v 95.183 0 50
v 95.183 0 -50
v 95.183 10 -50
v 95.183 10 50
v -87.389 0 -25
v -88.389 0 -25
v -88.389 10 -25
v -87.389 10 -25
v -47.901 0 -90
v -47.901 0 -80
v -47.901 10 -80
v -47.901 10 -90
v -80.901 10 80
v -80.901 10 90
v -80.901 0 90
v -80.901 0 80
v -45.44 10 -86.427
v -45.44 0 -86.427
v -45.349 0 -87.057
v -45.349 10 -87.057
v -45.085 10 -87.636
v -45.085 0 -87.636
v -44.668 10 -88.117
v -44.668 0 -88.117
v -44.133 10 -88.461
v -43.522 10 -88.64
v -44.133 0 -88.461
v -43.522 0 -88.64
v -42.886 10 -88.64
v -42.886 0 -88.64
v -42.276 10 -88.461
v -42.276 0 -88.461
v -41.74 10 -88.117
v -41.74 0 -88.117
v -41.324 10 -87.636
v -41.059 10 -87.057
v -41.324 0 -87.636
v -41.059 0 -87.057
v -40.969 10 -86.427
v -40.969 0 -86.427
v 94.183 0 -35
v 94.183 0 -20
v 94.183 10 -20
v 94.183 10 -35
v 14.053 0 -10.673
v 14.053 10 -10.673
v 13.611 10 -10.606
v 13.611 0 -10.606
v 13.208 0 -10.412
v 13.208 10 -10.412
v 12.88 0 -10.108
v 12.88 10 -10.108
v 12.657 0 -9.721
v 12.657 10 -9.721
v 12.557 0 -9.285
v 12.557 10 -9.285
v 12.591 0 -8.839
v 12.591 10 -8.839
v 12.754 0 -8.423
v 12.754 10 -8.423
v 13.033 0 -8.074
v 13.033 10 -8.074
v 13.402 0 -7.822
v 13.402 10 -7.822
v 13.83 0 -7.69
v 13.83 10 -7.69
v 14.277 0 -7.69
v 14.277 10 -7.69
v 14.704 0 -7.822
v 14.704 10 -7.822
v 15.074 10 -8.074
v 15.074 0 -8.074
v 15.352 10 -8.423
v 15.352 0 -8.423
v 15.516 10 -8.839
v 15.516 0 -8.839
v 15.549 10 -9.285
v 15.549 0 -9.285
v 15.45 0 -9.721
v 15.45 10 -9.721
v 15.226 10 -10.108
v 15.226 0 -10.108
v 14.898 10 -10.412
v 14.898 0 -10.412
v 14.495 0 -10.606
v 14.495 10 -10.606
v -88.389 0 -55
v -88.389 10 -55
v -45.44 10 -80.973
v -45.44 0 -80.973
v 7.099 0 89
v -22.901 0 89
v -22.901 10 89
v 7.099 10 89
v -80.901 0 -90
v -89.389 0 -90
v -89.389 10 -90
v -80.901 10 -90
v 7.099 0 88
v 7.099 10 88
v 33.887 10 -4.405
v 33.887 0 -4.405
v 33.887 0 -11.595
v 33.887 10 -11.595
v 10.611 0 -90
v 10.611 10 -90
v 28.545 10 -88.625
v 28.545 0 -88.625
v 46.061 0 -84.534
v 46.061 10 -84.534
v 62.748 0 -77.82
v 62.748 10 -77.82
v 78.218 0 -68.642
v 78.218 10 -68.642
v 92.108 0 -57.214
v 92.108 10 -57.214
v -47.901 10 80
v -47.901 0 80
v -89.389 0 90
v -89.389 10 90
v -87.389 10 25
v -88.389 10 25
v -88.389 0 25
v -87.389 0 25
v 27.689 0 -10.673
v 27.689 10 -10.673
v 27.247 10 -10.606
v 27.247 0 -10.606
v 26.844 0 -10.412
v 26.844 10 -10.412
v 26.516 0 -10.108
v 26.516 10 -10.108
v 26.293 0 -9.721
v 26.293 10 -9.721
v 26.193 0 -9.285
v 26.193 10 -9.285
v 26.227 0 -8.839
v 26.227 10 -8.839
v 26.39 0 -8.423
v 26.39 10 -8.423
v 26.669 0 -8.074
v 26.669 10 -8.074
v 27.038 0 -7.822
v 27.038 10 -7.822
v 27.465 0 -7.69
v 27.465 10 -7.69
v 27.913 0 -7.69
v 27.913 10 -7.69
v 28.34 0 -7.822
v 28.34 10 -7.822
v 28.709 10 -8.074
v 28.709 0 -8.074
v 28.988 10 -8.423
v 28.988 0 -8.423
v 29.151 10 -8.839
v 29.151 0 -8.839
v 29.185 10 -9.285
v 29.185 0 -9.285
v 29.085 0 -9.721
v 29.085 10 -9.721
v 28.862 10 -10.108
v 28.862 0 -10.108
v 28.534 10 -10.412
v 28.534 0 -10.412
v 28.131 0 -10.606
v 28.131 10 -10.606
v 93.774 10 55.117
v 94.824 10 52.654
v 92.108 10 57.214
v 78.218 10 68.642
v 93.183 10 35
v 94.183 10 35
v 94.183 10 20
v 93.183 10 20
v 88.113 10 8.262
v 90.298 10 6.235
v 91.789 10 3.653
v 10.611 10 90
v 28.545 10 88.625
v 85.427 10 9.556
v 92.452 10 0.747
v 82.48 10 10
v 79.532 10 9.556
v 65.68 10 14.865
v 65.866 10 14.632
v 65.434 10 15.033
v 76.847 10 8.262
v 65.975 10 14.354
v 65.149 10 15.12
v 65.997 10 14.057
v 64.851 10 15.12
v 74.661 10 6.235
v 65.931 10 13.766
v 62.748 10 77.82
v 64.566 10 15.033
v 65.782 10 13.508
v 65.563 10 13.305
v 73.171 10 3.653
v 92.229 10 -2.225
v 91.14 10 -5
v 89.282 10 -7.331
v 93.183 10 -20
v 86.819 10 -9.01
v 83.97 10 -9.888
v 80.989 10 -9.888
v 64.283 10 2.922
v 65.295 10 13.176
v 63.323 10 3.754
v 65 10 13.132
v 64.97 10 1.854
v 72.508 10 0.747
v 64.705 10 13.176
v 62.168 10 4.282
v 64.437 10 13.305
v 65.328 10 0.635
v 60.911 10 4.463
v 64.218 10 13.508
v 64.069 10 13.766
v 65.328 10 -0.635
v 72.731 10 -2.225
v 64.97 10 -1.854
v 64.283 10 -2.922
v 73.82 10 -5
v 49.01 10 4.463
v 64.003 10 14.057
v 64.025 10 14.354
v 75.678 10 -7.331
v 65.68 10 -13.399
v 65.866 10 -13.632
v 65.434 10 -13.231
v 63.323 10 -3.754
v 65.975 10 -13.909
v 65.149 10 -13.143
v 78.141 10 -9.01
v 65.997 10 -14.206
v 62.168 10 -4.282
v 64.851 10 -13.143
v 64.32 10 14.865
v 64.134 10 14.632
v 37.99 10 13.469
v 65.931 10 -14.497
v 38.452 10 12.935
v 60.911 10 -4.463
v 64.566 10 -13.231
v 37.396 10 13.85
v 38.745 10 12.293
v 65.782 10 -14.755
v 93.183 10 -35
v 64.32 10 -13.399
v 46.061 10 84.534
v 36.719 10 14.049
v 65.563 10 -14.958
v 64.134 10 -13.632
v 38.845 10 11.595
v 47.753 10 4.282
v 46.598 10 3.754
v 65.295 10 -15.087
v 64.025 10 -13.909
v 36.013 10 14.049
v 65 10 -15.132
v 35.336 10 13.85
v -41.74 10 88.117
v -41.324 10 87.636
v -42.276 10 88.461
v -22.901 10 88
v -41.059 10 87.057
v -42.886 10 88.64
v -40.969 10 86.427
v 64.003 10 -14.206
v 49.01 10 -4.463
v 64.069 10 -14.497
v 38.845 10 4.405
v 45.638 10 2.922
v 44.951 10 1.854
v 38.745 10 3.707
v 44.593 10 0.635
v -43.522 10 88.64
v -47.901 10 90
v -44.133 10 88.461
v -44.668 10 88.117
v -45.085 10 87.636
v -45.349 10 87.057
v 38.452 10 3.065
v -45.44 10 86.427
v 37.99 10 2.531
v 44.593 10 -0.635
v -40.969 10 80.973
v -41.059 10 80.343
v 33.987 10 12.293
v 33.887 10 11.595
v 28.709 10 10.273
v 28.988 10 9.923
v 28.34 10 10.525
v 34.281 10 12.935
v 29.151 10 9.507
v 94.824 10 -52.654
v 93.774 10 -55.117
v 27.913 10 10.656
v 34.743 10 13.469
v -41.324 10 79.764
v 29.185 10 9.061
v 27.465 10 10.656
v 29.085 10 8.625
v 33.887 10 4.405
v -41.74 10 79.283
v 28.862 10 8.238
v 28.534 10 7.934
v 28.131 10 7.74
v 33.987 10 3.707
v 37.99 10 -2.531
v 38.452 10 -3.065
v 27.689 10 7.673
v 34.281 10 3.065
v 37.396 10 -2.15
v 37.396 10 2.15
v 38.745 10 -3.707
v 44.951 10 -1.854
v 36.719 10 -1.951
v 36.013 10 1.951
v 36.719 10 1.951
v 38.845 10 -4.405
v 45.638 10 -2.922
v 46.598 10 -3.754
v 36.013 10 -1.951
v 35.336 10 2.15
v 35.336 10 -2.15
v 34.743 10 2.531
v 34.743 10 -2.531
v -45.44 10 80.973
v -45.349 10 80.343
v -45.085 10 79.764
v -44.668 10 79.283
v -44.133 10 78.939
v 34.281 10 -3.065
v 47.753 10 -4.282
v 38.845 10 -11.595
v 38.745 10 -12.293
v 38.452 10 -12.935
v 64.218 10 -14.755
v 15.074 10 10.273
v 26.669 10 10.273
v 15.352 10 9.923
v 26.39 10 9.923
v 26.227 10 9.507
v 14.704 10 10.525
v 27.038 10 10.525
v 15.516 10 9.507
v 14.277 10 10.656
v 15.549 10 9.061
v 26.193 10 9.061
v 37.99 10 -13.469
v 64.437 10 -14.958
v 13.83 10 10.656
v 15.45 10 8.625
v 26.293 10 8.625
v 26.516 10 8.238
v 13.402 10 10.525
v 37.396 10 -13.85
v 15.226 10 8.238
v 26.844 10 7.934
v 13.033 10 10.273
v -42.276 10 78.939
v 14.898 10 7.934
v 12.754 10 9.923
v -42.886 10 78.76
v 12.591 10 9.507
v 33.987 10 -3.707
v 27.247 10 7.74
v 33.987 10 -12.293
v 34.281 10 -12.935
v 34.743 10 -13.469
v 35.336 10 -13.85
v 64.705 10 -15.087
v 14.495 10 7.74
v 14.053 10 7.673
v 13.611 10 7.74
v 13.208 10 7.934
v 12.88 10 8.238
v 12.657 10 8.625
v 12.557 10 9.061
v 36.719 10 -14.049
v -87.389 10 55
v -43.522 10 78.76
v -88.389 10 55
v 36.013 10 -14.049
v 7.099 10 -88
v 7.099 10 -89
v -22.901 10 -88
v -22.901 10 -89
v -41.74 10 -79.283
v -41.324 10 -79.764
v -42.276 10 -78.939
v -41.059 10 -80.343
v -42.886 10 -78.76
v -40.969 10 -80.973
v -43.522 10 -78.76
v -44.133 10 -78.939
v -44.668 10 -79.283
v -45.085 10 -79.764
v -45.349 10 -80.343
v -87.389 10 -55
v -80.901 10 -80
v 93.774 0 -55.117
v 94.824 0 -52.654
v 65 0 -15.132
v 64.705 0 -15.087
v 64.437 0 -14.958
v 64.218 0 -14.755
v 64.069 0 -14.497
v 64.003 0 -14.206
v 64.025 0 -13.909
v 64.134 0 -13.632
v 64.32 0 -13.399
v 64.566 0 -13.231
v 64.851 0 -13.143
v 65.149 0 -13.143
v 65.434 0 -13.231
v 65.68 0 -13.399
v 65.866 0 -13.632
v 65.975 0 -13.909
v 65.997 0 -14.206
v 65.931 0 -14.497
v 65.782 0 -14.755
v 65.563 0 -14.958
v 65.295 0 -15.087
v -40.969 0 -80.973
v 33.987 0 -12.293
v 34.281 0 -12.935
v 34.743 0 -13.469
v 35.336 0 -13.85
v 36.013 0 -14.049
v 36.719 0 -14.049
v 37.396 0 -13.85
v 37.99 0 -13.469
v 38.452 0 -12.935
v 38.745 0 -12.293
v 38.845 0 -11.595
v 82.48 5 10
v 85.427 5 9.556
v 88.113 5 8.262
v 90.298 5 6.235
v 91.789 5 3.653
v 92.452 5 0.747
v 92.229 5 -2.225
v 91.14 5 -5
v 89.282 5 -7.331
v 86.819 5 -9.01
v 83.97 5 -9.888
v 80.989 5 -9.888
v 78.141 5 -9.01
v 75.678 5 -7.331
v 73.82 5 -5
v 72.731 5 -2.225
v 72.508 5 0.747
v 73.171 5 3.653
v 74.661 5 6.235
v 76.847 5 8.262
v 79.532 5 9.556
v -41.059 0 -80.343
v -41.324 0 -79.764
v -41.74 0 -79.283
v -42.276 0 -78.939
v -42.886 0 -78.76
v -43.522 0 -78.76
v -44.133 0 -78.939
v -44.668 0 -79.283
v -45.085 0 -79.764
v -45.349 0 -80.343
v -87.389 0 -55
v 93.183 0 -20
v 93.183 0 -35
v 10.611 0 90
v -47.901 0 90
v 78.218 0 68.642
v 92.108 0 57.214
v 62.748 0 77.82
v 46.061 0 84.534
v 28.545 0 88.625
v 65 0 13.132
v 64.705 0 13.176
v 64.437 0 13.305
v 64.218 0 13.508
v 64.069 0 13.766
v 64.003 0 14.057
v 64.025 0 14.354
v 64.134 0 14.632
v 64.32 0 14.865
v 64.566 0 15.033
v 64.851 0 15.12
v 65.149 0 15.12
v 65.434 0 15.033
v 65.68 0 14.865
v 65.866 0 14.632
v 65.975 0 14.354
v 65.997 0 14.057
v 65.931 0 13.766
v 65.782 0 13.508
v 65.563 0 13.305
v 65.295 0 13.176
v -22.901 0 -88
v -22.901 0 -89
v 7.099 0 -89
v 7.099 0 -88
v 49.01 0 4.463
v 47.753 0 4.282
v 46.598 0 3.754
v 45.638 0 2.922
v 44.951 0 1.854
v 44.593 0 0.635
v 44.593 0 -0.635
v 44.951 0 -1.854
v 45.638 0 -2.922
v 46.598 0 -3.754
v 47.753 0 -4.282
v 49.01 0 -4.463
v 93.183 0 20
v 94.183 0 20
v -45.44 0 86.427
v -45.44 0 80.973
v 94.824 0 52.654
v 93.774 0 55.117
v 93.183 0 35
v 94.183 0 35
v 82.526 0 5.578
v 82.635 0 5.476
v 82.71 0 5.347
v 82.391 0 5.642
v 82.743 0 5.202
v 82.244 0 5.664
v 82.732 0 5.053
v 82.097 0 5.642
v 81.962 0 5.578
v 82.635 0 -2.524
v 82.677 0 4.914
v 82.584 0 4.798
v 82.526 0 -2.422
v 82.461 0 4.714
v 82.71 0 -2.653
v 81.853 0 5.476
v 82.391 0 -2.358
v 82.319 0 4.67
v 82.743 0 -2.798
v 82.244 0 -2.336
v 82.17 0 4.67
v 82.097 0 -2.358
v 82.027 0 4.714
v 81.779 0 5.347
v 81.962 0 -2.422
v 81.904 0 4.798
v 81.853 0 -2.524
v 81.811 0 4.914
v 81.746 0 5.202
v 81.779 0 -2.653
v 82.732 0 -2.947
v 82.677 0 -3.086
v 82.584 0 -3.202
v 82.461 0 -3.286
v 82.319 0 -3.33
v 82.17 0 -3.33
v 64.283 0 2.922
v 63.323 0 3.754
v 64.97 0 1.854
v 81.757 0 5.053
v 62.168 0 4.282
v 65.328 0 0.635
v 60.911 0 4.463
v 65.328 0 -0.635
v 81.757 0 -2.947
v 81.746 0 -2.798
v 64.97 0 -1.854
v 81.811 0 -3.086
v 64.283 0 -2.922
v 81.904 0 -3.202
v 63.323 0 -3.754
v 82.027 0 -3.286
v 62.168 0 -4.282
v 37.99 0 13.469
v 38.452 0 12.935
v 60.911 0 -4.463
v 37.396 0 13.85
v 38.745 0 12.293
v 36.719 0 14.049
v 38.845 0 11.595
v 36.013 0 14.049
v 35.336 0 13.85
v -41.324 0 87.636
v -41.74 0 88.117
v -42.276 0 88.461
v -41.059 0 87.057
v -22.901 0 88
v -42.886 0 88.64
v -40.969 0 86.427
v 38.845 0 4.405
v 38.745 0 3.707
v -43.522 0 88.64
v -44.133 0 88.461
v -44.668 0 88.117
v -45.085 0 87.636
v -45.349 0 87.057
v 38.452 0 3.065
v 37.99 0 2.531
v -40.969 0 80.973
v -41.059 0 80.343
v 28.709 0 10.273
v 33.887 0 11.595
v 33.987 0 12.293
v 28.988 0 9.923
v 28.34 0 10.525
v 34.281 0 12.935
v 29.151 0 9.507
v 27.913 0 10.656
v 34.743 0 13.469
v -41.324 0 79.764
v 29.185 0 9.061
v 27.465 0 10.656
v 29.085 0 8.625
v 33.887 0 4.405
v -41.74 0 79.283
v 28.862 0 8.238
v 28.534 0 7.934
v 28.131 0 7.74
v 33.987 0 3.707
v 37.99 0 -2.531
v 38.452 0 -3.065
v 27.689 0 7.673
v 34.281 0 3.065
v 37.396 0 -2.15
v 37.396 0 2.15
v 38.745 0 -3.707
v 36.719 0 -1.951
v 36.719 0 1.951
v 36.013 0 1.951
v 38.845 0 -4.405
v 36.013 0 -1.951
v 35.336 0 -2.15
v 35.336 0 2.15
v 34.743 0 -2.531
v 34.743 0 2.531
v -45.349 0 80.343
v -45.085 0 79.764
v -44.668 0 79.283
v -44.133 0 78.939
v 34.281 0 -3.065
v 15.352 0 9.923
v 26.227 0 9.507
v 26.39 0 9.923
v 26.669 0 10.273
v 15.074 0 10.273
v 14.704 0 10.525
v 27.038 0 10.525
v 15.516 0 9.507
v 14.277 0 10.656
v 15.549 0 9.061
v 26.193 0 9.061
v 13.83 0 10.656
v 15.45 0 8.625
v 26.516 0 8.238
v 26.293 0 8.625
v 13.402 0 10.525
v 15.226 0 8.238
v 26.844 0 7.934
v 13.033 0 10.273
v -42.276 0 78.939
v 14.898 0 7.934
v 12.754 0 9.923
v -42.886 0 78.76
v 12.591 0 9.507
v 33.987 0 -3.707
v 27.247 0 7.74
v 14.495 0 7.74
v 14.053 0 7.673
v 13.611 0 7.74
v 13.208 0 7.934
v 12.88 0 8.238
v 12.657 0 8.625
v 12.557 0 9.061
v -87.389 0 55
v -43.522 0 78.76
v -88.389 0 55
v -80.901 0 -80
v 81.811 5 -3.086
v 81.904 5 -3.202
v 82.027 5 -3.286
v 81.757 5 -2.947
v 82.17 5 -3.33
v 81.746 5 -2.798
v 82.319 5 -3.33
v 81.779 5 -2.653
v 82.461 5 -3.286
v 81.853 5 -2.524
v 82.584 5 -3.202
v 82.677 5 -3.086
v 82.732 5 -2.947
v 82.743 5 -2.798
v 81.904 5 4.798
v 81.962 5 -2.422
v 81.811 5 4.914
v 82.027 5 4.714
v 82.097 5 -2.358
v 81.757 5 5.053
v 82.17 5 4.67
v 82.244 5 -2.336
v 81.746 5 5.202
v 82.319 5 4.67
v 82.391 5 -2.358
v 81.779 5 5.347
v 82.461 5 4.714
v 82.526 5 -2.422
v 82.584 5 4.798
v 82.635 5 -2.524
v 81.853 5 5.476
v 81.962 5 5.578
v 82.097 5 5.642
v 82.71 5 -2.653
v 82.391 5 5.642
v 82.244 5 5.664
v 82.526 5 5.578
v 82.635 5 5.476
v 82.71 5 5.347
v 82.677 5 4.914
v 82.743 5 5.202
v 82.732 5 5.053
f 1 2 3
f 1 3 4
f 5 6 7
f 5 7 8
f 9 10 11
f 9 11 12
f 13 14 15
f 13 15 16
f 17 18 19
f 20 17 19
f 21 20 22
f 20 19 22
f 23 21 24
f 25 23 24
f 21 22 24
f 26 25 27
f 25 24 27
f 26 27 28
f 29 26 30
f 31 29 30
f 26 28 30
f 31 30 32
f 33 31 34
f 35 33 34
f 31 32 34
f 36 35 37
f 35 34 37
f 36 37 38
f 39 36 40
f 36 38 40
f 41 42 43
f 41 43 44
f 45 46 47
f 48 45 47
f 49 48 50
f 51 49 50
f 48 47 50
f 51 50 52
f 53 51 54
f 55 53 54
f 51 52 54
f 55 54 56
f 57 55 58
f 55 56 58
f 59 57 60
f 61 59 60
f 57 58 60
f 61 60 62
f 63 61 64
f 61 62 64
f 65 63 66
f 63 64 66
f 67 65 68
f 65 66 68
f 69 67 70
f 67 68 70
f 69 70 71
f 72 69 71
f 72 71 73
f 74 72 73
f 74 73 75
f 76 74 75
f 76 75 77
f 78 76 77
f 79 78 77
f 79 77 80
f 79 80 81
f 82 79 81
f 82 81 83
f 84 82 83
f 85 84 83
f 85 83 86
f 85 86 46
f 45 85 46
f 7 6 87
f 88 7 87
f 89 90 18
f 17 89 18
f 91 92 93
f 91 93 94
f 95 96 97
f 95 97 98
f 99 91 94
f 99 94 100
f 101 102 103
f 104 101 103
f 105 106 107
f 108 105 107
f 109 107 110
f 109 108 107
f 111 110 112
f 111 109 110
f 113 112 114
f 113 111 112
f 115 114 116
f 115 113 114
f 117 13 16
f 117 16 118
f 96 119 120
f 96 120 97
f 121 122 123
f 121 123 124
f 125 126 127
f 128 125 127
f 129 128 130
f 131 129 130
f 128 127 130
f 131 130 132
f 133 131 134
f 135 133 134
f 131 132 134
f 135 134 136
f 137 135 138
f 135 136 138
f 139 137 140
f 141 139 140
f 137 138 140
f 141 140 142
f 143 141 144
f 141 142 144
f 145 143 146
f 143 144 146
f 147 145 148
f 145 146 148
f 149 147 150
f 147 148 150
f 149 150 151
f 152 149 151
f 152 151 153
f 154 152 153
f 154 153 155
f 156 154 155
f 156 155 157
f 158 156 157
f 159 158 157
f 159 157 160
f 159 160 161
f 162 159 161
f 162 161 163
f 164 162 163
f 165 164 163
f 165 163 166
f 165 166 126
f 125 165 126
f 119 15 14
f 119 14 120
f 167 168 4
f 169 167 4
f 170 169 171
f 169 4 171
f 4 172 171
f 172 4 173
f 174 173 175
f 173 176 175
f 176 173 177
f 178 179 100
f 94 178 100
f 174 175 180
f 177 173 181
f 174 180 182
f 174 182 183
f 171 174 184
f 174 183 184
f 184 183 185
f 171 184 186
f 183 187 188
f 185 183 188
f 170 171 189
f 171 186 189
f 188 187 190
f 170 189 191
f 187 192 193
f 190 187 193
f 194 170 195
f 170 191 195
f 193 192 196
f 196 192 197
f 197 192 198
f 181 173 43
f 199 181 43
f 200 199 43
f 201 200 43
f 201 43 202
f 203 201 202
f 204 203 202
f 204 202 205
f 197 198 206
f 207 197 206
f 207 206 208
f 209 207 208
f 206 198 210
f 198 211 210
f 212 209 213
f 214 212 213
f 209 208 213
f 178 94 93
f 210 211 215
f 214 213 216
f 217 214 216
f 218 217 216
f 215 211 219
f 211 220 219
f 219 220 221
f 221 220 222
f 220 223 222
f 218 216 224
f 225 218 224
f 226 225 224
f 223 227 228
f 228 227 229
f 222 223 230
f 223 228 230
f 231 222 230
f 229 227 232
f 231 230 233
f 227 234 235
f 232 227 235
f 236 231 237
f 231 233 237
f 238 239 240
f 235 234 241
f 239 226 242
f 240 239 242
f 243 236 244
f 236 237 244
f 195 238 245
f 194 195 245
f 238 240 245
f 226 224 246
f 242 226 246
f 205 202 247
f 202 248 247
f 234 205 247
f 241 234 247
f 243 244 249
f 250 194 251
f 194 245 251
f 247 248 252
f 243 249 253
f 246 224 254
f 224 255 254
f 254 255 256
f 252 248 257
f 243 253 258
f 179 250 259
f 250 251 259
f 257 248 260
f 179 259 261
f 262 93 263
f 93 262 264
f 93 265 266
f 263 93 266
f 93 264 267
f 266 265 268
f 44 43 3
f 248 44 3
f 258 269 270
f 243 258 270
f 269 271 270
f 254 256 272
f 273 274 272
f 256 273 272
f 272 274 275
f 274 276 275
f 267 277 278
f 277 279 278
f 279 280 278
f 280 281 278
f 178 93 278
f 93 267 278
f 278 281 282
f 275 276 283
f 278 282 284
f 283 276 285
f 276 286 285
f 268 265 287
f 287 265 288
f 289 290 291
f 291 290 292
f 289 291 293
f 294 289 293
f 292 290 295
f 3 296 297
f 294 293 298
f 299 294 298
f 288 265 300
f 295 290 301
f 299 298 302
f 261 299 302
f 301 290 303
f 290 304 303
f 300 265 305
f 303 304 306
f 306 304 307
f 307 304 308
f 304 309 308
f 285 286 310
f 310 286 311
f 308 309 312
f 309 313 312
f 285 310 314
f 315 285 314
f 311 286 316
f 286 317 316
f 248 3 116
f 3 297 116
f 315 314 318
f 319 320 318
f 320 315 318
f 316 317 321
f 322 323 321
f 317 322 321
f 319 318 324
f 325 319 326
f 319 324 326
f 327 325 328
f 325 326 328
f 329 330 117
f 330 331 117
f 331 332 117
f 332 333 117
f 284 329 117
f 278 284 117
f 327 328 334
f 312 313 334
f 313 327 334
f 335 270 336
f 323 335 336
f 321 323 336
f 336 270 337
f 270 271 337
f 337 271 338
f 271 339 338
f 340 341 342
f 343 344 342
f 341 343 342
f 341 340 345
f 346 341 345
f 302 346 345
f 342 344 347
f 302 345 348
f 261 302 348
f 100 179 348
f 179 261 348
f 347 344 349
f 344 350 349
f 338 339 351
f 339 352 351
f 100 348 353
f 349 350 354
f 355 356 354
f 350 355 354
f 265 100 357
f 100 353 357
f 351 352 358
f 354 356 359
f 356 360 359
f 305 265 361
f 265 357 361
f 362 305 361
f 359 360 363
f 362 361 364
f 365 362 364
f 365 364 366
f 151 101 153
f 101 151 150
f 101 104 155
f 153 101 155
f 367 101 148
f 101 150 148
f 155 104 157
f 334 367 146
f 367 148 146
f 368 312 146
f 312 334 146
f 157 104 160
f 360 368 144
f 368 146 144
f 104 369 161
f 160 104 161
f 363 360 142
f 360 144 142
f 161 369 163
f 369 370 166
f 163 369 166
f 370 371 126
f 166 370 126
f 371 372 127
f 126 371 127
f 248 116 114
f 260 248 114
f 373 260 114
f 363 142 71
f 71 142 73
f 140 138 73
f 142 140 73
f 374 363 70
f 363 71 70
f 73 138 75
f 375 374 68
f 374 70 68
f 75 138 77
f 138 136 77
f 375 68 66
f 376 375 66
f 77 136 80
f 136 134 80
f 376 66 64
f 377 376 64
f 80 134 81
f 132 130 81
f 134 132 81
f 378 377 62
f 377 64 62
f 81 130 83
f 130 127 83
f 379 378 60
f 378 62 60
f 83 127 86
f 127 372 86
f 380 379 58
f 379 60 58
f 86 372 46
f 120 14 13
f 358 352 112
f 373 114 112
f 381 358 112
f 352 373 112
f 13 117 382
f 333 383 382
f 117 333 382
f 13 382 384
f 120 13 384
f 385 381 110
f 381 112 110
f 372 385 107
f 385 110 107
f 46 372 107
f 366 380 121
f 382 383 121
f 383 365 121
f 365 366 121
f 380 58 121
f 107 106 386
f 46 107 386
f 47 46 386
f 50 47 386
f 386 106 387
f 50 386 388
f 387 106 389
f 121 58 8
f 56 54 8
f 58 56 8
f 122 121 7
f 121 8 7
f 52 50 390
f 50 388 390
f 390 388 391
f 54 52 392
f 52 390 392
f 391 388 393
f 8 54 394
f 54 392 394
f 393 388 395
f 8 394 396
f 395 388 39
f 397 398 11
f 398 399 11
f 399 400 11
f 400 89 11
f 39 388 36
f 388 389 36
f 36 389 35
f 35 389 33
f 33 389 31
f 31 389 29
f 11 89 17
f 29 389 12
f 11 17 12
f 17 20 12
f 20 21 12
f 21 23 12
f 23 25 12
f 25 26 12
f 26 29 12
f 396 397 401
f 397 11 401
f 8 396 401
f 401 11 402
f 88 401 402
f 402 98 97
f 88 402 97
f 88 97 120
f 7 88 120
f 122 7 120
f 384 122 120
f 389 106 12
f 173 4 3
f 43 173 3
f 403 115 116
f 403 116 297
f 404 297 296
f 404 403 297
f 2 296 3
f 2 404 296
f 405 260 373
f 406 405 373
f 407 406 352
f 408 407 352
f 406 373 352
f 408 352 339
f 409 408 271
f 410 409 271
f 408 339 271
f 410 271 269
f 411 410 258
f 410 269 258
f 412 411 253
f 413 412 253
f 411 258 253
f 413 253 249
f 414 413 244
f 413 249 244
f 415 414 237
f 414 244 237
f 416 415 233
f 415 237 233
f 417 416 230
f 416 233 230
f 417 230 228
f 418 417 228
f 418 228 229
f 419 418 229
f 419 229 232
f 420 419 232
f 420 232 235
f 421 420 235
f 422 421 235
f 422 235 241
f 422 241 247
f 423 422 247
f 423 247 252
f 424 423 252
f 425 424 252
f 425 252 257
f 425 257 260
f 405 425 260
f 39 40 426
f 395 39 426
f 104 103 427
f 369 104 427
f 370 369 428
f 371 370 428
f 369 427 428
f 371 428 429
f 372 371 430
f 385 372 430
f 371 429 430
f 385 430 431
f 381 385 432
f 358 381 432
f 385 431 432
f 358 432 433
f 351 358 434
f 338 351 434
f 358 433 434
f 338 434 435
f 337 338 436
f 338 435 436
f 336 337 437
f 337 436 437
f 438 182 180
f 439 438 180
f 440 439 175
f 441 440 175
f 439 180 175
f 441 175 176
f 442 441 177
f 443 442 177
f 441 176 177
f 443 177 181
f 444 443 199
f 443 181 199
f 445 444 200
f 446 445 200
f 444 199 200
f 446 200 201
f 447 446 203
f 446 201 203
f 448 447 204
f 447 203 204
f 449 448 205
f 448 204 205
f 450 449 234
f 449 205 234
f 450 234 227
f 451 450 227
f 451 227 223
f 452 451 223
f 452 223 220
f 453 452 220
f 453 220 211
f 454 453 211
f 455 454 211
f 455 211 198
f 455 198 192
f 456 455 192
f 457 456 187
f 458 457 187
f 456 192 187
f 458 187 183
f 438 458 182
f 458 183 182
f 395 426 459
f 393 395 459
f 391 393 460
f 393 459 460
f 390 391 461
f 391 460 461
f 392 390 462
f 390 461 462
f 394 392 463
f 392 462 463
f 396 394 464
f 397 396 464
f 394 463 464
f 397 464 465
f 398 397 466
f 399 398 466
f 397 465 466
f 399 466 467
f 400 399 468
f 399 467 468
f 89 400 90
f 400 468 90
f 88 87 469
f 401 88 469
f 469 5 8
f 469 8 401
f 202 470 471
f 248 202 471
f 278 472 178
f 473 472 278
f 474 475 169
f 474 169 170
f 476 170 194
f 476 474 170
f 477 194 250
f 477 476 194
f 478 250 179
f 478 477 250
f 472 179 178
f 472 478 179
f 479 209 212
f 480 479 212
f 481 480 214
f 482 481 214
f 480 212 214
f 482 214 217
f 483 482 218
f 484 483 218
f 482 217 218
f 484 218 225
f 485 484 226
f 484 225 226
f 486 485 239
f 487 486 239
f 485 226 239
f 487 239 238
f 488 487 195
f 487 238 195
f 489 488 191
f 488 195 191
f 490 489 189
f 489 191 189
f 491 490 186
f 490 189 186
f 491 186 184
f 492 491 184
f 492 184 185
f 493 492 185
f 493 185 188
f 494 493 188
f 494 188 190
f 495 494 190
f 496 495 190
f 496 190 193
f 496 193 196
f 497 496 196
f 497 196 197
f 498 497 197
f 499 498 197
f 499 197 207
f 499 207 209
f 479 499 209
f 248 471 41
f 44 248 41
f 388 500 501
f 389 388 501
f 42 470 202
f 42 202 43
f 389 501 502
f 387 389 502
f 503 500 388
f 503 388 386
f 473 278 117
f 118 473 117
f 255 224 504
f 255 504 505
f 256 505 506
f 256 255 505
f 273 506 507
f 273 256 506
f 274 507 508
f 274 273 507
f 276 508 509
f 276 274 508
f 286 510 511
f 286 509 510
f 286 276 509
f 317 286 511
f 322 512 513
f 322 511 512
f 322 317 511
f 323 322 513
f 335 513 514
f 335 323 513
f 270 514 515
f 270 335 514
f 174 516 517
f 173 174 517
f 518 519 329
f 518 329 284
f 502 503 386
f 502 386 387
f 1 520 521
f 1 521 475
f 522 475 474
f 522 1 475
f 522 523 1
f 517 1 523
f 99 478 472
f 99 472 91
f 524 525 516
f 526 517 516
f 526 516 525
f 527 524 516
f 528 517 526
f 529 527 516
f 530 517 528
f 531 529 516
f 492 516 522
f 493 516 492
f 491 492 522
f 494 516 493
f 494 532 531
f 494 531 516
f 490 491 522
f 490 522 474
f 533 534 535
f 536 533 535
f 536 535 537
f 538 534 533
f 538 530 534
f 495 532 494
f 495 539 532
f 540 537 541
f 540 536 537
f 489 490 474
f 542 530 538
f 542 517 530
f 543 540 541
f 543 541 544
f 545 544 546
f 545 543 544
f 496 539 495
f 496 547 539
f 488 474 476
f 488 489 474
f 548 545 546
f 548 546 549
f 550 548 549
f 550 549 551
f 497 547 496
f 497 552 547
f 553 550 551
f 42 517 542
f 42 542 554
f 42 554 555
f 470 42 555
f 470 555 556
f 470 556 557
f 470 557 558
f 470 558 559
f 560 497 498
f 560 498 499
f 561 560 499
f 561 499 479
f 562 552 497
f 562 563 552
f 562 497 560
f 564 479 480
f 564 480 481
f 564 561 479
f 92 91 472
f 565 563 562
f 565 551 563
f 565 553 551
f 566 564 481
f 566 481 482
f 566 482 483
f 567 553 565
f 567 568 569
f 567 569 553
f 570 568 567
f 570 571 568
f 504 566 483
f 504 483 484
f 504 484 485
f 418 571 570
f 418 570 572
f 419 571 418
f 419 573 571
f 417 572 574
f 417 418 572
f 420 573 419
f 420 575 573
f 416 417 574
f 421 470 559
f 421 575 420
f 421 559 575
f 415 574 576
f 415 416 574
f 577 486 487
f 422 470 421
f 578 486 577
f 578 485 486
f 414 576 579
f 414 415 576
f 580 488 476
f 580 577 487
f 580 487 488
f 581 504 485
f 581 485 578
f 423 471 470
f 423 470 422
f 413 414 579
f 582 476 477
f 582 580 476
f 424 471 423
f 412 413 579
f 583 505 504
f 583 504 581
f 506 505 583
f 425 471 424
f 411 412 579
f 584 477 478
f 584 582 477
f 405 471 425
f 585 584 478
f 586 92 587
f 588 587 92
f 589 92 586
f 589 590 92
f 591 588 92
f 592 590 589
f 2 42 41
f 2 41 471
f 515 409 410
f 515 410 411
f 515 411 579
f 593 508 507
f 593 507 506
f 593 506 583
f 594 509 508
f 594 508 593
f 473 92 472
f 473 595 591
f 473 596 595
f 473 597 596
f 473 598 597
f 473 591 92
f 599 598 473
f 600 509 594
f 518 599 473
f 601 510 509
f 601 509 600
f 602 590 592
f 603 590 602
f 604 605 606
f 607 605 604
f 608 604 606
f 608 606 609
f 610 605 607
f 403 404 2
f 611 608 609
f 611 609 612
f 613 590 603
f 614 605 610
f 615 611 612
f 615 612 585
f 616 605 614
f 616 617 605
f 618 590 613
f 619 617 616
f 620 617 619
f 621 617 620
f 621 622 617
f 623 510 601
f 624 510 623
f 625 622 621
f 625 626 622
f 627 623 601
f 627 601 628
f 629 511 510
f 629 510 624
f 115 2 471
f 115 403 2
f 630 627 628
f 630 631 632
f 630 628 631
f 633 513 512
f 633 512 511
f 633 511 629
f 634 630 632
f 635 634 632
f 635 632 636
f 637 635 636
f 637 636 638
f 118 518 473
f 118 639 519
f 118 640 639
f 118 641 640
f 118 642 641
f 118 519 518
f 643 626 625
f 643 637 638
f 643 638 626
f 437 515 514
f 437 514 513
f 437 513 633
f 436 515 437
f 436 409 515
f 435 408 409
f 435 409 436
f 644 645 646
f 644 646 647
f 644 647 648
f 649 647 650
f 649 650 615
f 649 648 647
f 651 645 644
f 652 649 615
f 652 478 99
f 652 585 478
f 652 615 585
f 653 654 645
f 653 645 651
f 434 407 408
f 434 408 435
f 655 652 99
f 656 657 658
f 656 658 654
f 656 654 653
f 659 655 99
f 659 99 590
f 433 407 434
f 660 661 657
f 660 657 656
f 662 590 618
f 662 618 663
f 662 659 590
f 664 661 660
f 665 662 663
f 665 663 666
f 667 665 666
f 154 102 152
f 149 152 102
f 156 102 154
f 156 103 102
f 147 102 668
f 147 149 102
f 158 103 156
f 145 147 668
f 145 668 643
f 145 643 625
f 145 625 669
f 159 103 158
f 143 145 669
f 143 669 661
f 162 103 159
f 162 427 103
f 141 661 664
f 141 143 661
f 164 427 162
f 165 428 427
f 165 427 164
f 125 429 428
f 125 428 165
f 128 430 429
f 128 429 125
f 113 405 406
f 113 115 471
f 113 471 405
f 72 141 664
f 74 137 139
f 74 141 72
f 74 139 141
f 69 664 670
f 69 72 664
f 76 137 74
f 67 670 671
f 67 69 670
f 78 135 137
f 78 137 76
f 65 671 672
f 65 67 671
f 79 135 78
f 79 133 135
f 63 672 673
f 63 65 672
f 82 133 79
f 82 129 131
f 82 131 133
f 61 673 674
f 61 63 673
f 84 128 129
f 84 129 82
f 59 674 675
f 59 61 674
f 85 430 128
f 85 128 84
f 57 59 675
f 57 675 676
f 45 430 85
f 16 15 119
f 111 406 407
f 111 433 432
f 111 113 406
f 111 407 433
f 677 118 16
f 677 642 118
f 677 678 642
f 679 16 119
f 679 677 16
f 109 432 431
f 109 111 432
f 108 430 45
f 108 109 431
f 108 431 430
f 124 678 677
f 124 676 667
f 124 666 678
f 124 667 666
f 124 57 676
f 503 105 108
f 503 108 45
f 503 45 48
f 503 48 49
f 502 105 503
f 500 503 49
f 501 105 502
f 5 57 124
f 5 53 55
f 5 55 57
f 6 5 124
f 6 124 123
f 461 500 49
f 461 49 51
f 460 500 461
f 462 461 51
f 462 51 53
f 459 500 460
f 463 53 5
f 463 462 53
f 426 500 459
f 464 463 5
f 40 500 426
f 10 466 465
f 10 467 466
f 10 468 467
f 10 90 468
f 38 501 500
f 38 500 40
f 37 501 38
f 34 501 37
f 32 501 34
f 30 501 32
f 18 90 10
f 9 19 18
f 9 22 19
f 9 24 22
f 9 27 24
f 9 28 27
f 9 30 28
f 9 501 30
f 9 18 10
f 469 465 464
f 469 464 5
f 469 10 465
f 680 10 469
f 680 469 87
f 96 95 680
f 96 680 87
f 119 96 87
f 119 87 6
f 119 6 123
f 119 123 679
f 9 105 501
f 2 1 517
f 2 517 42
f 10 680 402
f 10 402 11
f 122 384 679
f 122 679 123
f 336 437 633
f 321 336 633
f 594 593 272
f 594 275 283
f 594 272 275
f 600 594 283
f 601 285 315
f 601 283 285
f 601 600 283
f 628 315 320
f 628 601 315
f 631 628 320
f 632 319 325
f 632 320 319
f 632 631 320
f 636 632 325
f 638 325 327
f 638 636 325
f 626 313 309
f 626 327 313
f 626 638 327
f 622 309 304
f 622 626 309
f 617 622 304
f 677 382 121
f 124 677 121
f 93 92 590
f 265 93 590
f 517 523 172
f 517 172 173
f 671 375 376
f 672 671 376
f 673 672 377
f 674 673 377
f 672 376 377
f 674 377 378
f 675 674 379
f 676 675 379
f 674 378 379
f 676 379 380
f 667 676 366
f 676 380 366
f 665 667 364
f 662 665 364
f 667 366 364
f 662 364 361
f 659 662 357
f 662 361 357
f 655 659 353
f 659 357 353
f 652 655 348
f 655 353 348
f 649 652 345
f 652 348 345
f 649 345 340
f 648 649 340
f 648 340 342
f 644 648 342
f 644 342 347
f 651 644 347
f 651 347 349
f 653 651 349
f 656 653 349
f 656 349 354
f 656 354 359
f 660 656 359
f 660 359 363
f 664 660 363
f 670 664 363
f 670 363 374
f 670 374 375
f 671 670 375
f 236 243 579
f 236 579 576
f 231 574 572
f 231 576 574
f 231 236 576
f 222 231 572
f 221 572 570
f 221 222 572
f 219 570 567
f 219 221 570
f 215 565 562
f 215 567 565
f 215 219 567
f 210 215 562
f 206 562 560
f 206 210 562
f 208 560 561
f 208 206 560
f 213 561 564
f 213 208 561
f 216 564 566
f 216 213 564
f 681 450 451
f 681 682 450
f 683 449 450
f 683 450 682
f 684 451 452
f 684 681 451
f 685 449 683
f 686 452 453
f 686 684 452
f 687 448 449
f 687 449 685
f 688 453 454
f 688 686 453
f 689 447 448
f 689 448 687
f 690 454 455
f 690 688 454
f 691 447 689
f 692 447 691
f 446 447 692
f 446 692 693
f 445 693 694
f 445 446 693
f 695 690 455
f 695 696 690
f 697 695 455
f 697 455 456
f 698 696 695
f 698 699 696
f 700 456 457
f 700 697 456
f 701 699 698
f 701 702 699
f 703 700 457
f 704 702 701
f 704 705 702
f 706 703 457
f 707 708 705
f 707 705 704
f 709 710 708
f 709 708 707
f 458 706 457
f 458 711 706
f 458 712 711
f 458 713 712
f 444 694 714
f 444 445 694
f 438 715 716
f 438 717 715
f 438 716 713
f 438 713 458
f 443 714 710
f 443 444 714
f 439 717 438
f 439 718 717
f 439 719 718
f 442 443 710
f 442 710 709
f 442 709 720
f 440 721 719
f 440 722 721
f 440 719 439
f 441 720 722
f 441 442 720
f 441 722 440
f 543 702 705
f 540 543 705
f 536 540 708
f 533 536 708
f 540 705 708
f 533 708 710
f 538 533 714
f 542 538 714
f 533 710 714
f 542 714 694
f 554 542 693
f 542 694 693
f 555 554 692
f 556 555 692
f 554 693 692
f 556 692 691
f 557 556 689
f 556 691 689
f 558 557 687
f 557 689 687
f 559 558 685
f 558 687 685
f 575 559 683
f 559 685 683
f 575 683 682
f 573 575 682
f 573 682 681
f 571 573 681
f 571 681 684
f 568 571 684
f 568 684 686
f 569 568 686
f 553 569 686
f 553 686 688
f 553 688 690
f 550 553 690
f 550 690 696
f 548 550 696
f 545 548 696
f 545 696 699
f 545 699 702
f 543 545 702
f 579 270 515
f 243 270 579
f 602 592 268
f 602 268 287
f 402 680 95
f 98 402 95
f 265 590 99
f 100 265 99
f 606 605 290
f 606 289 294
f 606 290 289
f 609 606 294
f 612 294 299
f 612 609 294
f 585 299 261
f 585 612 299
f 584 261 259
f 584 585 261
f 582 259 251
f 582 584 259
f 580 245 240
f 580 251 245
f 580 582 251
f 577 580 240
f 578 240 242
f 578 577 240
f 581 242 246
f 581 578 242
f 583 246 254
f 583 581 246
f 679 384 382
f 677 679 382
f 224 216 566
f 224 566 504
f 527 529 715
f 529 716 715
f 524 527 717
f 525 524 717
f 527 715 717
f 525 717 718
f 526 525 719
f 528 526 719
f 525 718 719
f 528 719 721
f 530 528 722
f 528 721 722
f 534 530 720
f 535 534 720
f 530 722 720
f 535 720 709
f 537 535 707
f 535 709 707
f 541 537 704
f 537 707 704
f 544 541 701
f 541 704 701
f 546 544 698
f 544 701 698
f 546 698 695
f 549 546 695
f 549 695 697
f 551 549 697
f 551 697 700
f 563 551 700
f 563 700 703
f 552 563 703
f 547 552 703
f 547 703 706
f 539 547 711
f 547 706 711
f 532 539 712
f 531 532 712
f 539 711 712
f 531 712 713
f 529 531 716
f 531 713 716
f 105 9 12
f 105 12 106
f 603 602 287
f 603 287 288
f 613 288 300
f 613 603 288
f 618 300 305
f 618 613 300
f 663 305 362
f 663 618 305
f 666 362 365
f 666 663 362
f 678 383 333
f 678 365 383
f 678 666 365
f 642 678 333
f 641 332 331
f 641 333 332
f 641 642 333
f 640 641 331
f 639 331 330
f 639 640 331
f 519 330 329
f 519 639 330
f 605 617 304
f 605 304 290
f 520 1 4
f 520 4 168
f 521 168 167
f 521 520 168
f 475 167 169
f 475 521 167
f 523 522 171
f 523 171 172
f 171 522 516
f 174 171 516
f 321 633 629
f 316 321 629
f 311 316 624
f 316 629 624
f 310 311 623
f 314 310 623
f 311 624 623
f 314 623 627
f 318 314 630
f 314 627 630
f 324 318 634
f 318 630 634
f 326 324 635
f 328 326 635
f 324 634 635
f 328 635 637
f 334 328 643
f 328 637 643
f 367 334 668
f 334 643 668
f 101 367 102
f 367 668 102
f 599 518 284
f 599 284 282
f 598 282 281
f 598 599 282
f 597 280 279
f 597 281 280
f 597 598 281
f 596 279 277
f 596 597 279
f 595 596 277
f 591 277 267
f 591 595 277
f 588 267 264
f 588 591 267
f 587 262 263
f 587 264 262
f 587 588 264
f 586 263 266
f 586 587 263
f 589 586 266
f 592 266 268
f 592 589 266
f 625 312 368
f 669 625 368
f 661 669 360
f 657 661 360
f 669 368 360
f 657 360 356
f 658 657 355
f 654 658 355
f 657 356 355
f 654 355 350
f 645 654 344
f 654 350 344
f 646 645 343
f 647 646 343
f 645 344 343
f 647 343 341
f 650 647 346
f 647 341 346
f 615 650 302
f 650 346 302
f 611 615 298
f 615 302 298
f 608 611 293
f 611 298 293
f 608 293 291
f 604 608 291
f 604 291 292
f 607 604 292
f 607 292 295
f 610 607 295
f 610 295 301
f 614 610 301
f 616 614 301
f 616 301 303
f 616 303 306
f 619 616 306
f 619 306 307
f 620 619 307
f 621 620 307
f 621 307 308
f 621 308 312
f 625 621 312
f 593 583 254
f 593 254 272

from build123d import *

# Parameters (mm, degrees)
BOSS_EXTRUDE1_DEPTH = 10
SKETCH2_R           = 1
SKETCH2_R_2         = 1.5
SKETCH2_W           = 33
SKETCH2_H           = 10
CUT_EXTRUDE2_DEPTH  = 15
SKETCH3_R           = 10
CUT_EXTRUDE3_DEPTH  = 5
CUT_EXTRUDE4_DEPTH  = 15
SKETCH5_W           = 30
SKETCH5_H           = 1
SKETCH5_W_2         = 1
SKETCH5_H_2         = 30
SKETCH5_H_3         = 15
CUT_EXTRUDE6_DEPTH  = 15
SKETCH6_R           = 0.5
CUT_EXTRUDE7_DEPTH  = 15


with BuildPart() as part:
    # Sketch1 → Boss-Extrude1 (new body)
    with BuildSketch(Plane(origin=(0, 0, 0), x_dir=(1, 0, 0), z_dir=(0, 1, 0))):
        with BuildLine():
            Line((-89.389143795, -90), (-89.389143795, 90))
            Line((-89.389143795, 90), (10.610856205, 90))
            ThreePointArc((10.610856205, 90), (54.533138364, 81.496268076), (92.107774725, 57.214031174))
            ThreePointArc((92.107774725, 57.214031174), (94.381847518, 53.920998768), (95.182620993, 50))
            Line((95.182620993, 50), (95.182620993, -50))
            ThreePointArc((95.182620993, -50), (94.381847518, -53.920998768), (92.107774725, -57.214031174))
            ThreePointArc((92.107774725, -57.214031174), (54.533138364, -81.496268076), (10.610856205, -90))
            Line((10.610856205, -90), (-89.389143795, -90))
        make_face()
    extrude(amount=BOSS_EXTRUDE1_DEPTH)

    # Sketch2 → Cut-Extrude2 (cut, symmetric)
    with BuildSketch(Plane(origin=(0, 10, 0), x_dir=(1, 0, 0), z_dir=(0, 1, 0))):
        with Locations(Location((65, 14.131573434, 0), (0, 0, 90))):
            Circle(SKETCH2_R)
        with Locations(Location((27.688972694, 9.173126615, 0), (0, 0, 90))):
            Circle(SKETCH2_R_2)
        with Locations(Location((14.053243942, 9.173126615, 0), (0, 0, 90))):
            Circle(SKETCH2_R_2)
        with Locations(Location((14.053243942, -9.173126615, 0), (0, 0, 90))):
            Circle(SKETCH2_R_2)
        with Locations(Location((27.688972694, -9.173126615, 0), (0, 0, 90))):
            Circle(SKETCH2_R_2)
        with Locations(Location((65, -14.131573434, 0), (0, 0, 90))):
            Circle(SKETCH2_R)
        with BuildLine():
            Line((-40.968894473, 86.42714575), (-40.968894473, 80.97285425))
            ThreePointArc((-40.968894473, 80.97285425), (-43.204350858, 78.737397865), (-45.439807243, 80.97285425))
            Line((-45.439807243, 80.97285425), (-45.439807243, 86.42714575))
            ThreePointArc((-45.439807243, 86.42714575), (-43.204350858, 88.662602135), (-40.968894473, 86.42714575))
        make_face()
        with BuildLine():
            Line((38.845478036, 11.594873944), (38.845478036, 4.405126056))
            ThreePointArc((38.845478036, 4.405126056), (36.366254627, 1.925902647), (33.887031217, 4.405126056))
            Line((33.887031217, 4.405126056), (33.887031217, 11.594873944))
            ThreePointArc((33.887031217, 11.594873944), (36.366254627, 14.074097353), (38.845478036, 11.594873944))
        make_face()
        with Locations((-64.401012641, 85)):
            Rectangle(SKETCH2_W, SKETCH2_H)
        with BuildLine():
            Line((38.845478036, -11.594873944), (38.845478036, -4.405126056))
            ThreePointArc((38.845478036, -4.405126056), (36.366254627, -1.925902647), (33.887031217, -4.405126056))
            Line((33.887031217, -4.405126056), (33.887031217, -11.594873944))
            ThreePointArc((33.887031217, -11.594873944), (36.366254627, -14.074097353), (38.845478036, -11.594873944))
        make_face()
        with BuildLine():
            Line((-40.968894473, -86.42714575), (-40.968894473, -80.97285425))
            ThreePointArc((-40.968894473, -80.97285425), (-43.204350858, -78.737397865), (-45.439807243, -80.97285425))
            Line((-45.439807243, -80.97285425), (-45.439807243, -86.42714575))
            ThreePointArc((-45.439807243, -86.42714575), (-43.204350858, -88.662602135), (-40.968894473, -86.42714575))
        make_face()
        with Locations((-64.401012641, -85)):
            Rectangle(SKETCH2_W, SKETCH2_H)
    extrude(amount=CUT_EXTRUDE2_DEPTH, both=True, mode=Mode.SUBTRACT)

    # Sketch3 → Cut-Extrude3 (cut, symmetric)
    with BuildSketch(Plane(origin=(0, 10, 0), x_dir=(1, 0, 0), z_dir=(0, 1, 0))):
        with Locations(Location((82.479810043, 0, 0), (0, 0, 270))):
            Circle(SKETCH3_R)
    extrude(amount=CUT_EXTRUDE3_DEPTH, both=True, mode=Mode.SUBTRACT)

    # Sketch4 → Cut-Extrude4 (cut, symmetric)
    with BuildSketch(Plane(origin=(0, 10, 0), x_dir=(1, 0, 0), z_dir=(0, 1, 0))):
        with BuildLine():
            Line((49.010294015, 4.462602137), (60.91056638, 4.462602137))
            ThreePointArc((60.91056638, 4.462602137), (65.373168517, 0), (60.91056638, -4.462602137))
            Line((60.91056638, -4.462602137), (49.010294015, -4.462602137))
            ThreePointArc((49.010294015, -4.462602137), (44.547691878, 0), (49.010294015, 4.462602137))
        make_face()
    extrude(amount=CUT_EXTRUDE4_DEPTH, both=True, mode=Mode.SUBTRACT)

    # Sketch5 → Cut-Extrude6 (cut, symmetric)
    with BuildSketch(Plane(origin=(0, 10, 0), x_dir=(1, 0, 0), z_dir=(0, 1, 0))):
        with Locations((-7.901012641, 88.5)):
            Rectangle(SKETCH5_W, SKETCH5_H)
        with Locations((-87.889143795, 40)):
            Rectangle(SKETCH5_W_2, SKETCH5_H_2)
        with Locations((93.682620993, 27.5)):
            Rectangle(SKETCH5_W_2, SKETCH5_H_3)
        with Locations((93.682620993, -27.5)):
            Rectangle(SKETCH5_W_2, SKETCH5_H_3)
        with Locations((-7.901012641, -88.5)):
            Rectangle(SKETCH5_W, SKETCH5_H)
        with Locations((-87.889143795, -40)):
            Rectangle(SKETCH5_W_2, SKETCH5_H_2)
    extrude(amount=CUT_EXTRUDE6_DEPTH, both=True, mode=Mode.SUBTRACT)

    # Sketch6 → Cut-Extrude7 (cut, symmetric)
    with BuildSketch(Plane(origin=(0, 5, 0), x_dir=(1, 0, 0), z_dir=(0, 1, 0))):
        with Locations(Location((82.244112685, 2.835581496, 0), (0, 0, 270))):
            Circle(SKETCH6_R)
        with Locations(Location((82.244112685, -5.164418504, 0), (0, 0, 270))):
            Circle(SKETCH6_R)
    extrude(amount=CUT_EXTRUDE7_DEPTH, both=True, mode=Mode.SUBTRACT)


solid = part.part
